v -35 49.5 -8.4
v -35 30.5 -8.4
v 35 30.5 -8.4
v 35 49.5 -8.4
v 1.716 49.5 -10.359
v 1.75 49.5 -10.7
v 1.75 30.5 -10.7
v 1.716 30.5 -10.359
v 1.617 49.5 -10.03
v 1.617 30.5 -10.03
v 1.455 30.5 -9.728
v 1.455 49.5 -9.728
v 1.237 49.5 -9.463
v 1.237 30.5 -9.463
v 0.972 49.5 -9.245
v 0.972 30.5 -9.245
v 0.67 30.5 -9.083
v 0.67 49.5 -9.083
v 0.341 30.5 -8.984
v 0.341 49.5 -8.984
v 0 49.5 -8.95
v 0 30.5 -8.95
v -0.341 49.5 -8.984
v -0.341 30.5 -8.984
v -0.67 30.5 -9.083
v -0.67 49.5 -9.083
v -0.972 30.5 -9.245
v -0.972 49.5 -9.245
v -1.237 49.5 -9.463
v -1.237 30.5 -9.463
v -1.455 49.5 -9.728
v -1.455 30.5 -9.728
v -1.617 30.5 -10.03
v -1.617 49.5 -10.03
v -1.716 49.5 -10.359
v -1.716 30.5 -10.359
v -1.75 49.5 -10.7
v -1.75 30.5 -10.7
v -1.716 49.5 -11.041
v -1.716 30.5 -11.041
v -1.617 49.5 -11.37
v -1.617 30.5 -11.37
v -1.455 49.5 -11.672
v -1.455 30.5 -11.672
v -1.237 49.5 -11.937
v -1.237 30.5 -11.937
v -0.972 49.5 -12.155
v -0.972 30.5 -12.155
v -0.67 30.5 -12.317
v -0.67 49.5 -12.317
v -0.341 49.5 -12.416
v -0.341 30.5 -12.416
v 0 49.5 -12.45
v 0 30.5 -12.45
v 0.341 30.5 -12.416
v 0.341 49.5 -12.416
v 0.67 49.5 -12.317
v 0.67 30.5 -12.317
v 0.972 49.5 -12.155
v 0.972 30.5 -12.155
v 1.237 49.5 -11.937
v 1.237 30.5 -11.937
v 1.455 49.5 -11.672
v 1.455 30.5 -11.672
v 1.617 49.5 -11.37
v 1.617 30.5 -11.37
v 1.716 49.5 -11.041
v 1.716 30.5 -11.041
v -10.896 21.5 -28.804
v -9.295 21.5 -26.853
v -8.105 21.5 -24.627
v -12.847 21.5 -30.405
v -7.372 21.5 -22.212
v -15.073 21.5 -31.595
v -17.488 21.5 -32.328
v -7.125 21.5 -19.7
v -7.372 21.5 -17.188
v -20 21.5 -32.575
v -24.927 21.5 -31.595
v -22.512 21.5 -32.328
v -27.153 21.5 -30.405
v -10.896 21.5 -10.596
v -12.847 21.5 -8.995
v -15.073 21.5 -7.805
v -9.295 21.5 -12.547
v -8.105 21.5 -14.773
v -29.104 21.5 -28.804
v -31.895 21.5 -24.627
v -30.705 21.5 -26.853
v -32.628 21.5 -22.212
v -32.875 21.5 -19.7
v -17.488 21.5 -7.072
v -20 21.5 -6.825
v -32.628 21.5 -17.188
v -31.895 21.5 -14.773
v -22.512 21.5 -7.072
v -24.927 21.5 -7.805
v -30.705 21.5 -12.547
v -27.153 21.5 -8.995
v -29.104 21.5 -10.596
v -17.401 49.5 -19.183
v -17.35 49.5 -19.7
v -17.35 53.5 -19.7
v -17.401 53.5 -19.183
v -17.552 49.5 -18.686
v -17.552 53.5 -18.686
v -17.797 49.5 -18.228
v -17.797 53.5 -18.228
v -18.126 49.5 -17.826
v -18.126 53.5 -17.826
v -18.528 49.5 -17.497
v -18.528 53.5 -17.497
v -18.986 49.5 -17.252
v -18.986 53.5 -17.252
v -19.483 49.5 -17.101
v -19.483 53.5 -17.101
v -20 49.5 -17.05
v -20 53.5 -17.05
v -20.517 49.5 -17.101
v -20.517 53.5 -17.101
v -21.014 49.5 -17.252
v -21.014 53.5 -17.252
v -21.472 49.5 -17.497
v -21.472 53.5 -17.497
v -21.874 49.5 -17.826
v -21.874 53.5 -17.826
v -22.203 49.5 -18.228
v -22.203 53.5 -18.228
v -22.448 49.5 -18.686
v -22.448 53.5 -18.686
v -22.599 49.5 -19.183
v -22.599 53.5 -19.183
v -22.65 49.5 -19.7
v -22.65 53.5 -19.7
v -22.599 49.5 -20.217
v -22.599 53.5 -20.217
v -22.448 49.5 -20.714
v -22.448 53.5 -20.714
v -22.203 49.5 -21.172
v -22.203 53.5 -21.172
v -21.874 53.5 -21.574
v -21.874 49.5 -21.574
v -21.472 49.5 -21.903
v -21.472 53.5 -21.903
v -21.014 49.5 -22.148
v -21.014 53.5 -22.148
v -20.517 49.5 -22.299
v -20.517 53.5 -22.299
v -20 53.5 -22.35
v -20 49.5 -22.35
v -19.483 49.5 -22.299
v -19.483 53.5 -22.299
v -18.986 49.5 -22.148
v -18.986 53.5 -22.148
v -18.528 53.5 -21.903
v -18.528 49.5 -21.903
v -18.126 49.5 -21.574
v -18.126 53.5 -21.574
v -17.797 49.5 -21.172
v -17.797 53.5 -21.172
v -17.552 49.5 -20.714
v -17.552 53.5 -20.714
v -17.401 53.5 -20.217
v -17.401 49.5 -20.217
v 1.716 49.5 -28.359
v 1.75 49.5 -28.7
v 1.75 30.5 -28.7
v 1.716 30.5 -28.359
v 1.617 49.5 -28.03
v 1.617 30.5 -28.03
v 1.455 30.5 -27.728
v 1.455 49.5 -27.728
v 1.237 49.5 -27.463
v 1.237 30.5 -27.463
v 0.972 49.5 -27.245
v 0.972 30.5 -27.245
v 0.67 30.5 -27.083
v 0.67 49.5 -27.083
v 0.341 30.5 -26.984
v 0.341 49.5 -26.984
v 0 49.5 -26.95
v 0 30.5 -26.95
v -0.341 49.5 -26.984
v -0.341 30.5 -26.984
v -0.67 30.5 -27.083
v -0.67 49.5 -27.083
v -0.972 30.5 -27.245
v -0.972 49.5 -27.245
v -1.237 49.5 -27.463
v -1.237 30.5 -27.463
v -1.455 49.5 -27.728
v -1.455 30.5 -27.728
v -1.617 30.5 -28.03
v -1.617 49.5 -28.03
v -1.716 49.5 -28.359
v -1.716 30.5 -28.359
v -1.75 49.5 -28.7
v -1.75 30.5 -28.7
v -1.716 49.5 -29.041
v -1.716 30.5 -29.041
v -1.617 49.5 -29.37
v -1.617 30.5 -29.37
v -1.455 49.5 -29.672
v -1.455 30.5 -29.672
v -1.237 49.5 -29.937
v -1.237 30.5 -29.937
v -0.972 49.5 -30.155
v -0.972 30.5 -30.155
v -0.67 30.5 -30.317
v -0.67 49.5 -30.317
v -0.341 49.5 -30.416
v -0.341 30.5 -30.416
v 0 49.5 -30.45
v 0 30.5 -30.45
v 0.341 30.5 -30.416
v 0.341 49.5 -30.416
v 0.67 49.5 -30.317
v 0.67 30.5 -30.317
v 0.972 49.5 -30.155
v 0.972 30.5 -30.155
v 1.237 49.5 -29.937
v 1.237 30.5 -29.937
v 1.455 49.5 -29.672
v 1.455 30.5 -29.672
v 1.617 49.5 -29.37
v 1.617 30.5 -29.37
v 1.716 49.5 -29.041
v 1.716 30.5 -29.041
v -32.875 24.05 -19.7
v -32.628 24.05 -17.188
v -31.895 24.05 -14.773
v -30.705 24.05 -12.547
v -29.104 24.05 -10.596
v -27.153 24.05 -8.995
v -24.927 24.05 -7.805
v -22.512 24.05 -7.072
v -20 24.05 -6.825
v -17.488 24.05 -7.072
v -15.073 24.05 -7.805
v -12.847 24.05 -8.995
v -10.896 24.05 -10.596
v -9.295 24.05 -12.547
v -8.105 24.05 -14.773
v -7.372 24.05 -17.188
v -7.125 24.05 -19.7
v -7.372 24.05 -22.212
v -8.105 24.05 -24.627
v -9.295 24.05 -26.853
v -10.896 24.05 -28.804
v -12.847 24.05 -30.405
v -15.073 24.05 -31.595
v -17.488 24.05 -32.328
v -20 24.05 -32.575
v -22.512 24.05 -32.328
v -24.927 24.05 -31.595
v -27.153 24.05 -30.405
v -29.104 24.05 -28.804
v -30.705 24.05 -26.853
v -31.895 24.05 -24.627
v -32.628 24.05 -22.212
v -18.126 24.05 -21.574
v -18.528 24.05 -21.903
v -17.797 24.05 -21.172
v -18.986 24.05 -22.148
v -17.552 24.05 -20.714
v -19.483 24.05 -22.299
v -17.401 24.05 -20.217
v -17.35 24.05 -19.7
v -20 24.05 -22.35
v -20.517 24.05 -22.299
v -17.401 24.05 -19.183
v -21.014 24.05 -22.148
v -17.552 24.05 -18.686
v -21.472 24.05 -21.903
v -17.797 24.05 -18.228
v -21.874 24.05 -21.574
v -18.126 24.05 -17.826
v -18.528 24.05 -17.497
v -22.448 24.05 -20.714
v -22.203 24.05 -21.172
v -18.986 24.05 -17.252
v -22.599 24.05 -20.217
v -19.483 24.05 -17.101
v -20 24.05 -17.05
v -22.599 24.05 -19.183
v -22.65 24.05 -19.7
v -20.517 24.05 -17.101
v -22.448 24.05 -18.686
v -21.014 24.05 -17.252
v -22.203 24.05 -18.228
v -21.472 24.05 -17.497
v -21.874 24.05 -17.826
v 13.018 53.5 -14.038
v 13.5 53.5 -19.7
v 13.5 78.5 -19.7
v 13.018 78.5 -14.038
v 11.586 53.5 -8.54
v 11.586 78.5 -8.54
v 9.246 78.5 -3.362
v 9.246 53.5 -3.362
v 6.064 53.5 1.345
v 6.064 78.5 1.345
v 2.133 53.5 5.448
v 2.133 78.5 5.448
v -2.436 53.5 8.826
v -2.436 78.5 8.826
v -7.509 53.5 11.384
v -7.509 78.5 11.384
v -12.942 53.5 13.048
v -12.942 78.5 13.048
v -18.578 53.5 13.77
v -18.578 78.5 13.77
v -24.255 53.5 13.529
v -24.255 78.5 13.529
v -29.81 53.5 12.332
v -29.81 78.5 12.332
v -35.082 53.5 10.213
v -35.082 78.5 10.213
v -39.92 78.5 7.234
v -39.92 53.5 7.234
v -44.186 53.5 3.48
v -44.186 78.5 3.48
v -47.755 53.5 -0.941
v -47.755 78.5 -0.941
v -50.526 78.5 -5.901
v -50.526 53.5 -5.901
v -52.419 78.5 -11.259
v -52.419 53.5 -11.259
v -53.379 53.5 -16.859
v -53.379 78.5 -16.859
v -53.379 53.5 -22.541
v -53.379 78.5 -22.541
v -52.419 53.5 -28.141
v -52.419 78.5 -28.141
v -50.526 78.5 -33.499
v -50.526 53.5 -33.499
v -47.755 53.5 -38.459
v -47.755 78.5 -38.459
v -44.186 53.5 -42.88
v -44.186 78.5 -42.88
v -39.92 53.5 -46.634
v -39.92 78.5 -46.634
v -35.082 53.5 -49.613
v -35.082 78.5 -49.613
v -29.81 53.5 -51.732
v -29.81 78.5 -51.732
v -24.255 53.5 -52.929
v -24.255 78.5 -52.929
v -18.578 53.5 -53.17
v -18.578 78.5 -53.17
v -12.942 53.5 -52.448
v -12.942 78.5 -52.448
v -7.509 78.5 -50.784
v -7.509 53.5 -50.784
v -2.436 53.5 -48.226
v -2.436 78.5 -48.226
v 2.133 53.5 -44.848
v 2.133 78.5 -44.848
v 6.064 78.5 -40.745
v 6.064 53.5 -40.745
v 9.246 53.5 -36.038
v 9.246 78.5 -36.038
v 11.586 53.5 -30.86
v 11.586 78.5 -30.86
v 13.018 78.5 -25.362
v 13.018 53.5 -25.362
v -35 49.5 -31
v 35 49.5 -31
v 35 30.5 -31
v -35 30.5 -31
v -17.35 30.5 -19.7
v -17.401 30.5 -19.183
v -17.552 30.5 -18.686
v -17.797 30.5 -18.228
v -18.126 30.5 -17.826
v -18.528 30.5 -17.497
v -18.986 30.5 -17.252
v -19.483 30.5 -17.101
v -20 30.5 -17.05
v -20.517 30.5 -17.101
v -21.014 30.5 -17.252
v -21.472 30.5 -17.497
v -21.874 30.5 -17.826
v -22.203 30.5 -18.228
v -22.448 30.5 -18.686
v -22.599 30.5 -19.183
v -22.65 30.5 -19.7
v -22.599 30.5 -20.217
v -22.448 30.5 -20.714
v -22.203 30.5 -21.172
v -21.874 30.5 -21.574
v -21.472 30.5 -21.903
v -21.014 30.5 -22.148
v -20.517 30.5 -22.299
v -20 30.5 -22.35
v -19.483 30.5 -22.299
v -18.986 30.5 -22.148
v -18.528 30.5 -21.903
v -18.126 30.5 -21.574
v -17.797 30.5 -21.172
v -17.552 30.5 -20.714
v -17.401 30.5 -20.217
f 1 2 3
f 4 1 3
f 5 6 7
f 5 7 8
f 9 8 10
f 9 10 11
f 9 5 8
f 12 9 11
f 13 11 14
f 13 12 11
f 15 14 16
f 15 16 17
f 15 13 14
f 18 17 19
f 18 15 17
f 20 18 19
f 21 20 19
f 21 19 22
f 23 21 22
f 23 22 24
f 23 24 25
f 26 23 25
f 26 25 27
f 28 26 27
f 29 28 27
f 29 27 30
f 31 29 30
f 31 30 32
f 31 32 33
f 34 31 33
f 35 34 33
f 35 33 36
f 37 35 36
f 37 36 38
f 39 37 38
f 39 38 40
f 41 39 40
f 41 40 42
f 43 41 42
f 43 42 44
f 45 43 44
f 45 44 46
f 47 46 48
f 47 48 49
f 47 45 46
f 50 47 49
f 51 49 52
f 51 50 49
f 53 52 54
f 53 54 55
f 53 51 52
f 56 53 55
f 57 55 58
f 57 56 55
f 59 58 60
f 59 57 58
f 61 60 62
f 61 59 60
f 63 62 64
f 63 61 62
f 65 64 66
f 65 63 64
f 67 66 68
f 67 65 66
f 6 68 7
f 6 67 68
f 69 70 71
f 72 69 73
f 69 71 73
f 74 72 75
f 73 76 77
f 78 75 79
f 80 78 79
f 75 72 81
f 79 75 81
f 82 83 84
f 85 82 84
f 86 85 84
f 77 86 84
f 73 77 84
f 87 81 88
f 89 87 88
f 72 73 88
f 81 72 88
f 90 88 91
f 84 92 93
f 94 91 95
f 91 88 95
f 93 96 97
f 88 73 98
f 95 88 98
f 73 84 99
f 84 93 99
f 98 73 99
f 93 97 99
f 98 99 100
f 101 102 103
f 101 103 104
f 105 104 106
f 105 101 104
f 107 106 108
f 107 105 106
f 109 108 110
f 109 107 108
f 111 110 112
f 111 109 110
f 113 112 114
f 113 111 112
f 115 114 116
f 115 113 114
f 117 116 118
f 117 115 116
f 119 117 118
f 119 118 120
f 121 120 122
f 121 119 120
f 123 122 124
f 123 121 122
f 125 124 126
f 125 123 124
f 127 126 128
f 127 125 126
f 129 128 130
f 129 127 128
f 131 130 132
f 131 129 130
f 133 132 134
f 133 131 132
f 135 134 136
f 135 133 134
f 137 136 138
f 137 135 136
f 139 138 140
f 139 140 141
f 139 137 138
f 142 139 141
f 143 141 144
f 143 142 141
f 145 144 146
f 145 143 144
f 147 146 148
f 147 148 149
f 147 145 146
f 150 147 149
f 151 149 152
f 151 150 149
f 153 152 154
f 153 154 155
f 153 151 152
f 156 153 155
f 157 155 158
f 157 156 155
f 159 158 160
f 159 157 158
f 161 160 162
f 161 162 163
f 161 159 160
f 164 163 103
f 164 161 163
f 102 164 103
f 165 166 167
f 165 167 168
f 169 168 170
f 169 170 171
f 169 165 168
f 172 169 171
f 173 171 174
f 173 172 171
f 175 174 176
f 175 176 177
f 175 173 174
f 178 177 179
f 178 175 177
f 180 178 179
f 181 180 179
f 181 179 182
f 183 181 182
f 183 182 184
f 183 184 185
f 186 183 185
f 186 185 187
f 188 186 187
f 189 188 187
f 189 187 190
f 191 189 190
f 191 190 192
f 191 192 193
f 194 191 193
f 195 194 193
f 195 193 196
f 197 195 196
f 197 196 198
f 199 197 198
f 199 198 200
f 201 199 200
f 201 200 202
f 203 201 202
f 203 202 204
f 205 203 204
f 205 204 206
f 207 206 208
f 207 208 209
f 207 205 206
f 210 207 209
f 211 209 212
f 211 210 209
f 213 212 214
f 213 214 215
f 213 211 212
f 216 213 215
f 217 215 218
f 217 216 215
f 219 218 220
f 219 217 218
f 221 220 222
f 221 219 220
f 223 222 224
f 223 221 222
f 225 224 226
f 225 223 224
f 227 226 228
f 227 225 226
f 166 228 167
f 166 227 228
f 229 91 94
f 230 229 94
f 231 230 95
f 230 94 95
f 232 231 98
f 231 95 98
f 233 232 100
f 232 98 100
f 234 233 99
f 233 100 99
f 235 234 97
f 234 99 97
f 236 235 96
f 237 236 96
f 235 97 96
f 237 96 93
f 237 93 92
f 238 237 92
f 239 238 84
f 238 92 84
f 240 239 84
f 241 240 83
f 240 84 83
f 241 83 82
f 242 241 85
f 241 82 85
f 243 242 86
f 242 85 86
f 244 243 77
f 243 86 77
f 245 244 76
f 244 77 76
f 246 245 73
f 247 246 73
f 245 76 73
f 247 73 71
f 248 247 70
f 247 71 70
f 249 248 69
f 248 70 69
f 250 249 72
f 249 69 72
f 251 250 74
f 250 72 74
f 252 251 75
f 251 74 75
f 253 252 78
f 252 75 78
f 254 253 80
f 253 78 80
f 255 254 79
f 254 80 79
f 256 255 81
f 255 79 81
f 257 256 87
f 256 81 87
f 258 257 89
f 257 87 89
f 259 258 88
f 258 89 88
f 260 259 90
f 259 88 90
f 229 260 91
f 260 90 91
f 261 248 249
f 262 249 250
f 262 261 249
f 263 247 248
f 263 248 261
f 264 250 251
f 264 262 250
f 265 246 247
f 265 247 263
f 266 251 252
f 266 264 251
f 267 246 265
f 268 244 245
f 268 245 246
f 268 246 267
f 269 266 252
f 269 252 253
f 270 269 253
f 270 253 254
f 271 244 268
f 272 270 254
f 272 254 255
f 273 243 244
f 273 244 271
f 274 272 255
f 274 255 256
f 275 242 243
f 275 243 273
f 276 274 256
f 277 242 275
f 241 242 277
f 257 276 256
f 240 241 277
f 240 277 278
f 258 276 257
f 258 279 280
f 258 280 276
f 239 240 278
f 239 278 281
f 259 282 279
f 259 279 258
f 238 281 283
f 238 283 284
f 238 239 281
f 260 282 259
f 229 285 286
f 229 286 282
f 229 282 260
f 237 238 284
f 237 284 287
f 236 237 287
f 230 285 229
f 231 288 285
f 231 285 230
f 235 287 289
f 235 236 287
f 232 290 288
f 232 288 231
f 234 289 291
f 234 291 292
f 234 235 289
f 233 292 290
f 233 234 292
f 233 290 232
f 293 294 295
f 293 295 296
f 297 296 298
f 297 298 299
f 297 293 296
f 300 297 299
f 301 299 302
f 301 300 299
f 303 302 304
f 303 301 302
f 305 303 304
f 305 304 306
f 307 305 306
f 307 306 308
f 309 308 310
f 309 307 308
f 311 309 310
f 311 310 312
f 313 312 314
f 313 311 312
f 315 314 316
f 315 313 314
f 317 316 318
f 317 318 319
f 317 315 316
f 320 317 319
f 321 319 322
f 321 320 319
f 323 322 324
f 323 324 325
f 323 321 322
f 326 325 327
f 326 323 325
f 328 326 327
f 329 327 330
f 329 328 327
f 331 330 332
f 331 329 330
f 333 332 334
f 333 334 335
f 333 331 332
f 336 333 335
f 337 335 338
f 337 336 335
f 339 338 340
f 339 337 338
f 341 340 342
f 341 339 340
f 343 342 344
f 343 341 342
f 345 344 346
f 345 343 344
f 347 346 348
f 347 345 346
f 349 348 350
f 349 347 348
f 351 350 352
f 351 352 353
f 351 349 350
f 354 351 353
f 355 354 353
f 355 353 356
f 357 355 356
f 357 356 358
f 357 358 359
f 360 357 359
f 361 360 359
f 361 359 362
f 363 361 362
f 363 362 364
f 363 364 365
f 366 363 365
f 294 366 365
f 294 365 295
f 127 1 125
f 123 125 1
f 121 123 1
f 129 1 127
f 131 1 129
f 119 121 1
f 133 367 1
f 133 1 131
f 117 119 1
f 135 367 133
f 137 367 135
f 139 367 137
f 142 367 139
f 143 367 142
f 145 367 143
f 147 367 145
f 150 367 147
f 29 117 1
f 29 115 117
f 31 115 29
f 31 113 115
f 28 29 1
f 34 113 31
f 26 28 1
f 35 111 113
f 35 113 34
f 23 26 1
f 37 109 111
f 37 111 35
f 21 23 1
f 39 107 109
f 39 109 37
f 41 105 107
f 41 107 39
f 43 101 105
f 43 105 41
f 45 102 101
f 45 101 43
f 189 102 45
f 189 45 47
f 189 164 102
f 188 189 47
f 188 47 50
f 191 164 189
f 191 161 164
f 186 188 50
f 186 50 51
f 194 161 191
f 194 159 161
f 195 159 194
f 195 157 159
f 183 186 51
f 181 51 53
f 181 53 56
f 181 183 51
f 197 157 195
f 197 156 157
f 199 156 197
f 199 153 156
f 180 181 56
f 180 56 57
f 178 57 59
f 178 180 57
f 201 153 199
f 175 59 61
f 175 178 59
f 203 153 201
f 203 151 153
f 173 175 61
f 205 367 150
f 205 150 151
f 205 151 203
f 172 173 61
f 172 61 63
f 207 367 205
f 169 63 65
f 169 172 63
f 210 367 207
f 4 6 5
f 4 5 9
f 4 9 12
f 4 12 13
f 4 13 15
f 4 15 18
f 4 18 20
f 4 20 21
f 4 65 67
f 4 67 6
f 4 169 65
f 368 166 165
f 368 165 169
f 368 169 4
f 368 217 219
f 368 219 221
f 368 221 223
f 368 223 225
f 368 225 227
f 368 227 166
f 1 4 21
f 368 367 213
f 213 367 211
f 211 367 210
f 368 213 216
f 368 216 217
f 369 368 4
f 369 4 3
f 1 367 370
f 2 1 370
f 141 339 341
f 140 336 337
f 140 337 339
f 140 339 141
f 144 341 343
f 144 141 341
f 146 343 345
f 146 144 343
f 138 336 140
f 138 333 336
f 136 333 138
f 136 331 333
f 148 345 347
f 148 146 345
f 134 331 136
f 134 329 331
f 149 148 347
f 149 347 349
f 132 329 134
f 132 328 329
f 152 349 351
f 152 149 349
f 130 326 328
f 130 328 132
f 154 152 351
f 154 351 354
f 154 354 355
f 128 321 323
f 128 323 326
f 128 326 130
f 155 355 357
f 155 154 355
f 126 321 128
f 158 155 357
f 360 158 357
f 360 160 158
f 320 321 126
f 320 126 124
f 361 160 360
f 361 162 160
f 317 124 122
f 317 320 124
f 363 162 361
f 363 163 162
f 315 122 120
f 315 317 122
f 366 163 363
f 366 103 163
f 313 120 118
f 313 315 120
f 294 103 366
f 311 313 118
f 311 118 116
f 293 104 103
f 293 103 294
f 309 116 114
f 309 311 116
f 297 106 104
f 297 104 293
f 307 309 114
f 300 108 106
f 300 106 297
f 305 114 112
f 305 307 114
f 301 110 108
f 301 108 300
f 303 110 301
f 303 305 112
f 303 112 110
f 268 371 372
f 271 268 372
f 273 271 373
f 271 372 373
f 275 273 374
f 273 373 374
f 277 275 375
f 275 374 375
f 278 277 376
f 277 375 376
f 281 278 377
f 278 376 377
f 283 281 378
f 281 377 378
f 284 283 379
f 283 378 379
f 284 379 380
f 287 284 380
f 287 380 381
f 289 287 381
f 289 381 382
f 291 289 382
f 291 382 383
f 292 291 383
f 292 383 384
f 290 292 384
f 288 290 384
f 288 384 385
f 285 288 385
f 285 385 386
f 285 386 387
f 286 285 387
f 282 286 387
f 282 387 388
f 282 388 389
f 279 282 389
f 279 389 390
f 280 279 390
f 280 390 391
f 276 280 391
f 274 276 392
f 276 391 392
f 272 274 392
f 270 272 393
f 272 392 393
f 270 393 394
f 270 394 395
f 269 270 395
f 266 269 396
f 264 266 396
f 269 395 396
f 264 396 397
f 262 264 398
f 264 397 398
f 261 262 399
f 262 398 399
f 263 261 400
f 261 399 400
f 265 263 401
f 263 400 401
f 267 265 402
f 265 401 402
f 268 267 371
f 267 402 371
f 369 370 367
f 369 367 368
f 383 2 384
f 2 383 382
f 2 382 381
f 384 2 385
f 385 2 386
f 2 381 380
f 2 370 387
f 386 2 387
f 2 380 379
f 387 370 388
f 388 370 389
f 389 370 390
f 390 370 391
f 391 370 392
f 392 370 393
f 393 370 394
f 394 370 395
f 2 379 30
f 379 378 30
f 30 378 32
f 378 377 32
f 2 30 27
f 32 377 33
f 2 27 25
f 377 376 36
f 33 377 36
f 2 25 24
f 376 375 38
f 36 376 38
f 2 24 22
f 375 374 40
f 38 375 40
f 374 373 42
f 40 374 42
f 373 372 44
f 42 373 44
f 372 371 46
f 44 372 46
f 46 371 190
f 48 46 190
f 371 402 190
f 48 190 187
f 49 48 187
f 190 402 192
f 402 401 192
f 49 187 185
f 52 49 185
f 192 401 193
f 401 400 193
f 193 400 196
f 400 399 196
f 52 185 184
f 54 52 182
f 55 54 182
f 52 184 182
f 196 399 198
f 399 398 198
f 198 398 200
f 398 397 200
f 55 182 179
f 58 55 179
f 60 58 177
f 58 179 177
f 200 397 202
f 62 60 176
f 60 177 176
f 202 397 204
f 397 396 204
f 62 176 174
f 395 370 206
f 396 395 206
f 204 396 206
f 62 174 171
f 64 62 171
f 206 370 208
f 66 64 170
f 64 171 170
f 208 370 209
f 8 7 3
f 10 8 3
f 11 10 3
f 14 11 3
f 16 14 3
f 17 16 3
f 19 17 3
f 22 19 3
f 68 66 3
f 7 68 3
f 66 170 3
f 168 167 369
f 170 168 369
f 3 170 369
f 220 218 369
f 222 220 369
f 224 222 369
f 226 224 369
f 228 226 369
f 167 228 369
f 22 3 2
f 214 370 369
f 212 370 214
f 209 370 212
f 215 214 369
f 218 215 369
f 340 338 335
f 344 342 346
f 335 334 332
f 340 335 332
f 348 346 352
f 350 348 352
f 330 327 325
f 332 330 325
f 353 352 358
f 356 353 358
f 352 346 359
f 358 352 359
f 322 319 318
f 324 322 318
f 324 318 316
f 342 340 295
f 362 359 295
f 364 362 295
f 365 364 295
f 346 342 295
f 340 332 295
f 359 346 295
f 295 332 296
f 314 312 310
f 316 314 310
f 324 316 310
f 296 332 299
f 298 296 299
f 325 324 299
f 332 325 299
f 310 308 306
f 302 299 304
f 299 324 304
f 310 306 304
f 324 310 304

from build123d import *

# Parameters (mm, degrees)
SKETCH023_W       = 70
SKETCH023_H       = 19
PAD010_DEPTH      = 22.6
SKETCH001_R       = 1.75
POCKET007_DEPTH   = 19.001
SKETCH002_R       = 2.65
PAD011_DEPTH      = 4
PAD011_DEPTH_BACK = 28
SKETCH026_R       = 33.5
PAD014_DEPTH      = 25
SKETCH027_R       = 12.875
PAD015_DEPTH      = 2.55


with BuildPart() as moteurroue:
    # Sketch023 → Pad010 (new body)
    with BuildSketch(Plane.XY):
        Rectangle(SKETCH023_W, SKETCH023_H)
    extrude(amount=PAD010_DEPTH)

    # Sketch001 (on Face3 of Pad010) → Pocket007 (cut, through all)
    with BuildSketch(Plane.XZ.offset(9.5)):
        with Locations((0, 20.3)):
            Circle(SKETCH001_R)
        with Locations((0, 2.3)):
            Circle(SKETCH001_R)
    extrude(amount=-POCKET007_DEPTH, mode=Mode.SUBTRACT)

    # Sketch002 (on Face8 of Pocket007) → Pad011 (join, two sides)
    with BuildSketch(Plane.XZ.offset(9.5)) as pad011_sk:
        with Locations((-20, 11.3)):
            Circle(SKETCH002_R)
    extrude(amount=PAD011_DEPTH)
    extrude(pad011_sk.sketch, amount=-PAD011_DEPTH_BACK)

    # Sketch026 (on Face12 of Pad011) → Pad014 (join)
    with BuildSketch(Plane.XZ.offset(13.5)):
        with Locations((-20, 11.3)):
            Circle(SKETCH026_R)
    extrude(amount=PAD014_DEPTH)

    # Sketch027 (on Face14 of Pad014) → Pad015 (join)
    with BuildSketch(Plane(origin=(0, 18.5, 0), x_dir=(-1, 0, 0), z_dir=(0, 1, 0))):
        with Locations((20, 11.3)):
            Circle(SKETCH027_R)
    extrude(amount=-PAD015_DEPTH)


with BuildPart() as moteurroue_1:
    # Body002 placement: moved
    add(moteurroue.part.moved(Location((0, -40, -31))))


with BuildPart() as part_mirroring:
    # Part__Mirroring: instance of MoteurRoue
    add(moteurroue_1.part.mirror(Plane(origin=(0, 0, 0), x_dir=(1, 0, 0), z_dir=(0, 1, 0))))


solid = part_mirroring.part
